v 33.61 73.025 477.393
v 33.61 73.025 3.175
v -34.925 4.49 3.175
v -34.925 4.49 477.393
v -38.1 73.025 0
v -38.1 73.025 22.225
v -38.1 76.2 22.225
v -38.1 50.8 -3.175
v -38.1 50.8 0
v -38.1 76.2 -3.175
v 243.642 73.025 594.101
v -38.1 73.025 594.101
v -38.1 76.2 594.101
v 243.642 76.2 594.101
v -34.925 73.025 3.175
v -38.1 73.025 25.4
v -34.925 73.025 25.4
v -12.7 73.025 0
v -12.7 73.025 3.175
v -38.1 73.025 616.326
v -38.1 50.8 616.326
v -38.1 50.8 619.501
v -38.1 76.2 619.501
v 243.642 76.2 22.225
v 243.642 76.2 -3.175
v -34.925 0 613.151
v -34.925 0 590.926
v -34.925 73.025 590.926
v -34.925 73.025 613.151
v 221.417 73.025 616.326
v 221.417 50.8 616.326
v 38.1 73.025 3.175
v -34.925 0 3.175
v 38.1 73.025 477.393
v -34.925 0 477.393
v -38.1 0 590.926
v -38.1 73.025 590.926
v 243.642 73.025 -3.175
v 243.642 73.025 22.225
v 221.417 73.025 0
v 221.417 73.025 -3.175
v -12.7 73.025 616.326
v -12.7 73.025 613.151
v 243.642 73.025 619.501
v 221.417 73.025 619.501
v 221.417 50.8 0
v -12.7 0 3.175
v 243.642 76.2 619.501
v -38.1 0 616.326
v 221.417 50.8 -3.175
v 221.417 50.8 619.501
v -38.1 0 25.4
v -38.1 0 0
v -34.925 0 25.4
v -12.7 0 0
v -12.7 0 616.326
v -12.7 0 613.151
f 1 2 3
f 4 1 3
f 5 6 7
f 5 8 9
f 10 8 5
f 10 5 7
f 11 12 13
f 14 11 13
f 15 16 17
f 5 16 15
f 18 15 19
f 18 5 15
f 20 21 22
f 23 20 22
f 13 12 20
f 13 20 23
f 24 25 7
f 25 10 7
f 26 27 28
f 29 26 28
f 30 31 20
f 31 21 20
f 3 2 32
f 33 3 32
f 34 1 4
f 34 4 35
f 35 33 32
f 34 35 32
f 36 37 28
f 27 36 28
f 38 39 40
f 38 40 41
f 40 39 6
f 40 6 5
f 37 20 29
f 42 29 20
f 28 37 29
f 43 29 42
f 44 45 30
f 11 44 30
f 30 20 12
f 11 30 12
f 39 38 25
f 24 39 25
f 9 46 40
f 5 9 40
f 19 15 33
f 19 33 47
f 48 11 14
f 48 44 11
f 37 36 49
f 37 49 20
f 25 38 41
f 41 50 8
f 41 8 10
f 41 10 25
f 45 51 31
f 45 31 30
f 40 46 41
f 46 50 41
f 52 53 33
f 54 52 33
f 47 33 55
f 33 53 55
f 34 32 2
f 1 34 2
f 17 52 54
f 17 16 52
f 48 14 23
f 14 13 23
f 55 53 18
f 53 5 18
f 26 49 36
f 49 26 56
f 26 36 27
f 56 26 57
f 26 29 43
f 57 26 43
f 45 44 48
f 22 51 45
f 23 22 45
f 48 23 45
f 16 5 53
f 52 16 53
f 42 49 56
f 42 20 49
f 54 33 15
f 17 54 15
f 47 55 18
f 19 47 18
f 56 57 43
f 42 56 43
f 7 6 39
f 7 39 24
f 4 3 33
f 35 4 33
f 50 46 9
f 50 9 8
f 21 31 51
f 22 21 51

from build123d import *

# Parameters (mm, degrees)
F0_W      = 22.225
F0_H      = 22.225
F0_W_2    = 3.175
F0_H_2    = 3.175
F1_DEPTH  = 3.175
F2_START  = 3.175
F2_DEPTH  = 474.218
F3_DEPTH  = 22.225
F4_START  = -619.50092
F1_FACE_W = 76.2
F1_FACE_H = 25.4
F4_DEPTH  = 3.175
F5_START  = 571.87592
F3_FACE_W = 76.2
F3_FACE_H = 3.175
F5_DEPTH  = 22.225
F6_DEPTH  = 3.175
F7_DEPTH  = 25.4
F8_START  = 565.52592
F7_FACE_W = 3.175
F7_FACE_H = 73.025
F8_DEPTH  = 25.4
F9_START  = 609.97592
F6_FACE_W = 22.225
F6_FACE_H = 73.025
F9_DEPTH  = 3.175
F10_W     = 3.175
F10_H     = 3.175
F10_H_2   = 22.225
F11_DEPTH = 205.54188
F12_DEPTH = 183.31688
F13_DEPTH = 205.54188
F10_W_2   = 22.225
F14_DEPTH = 183.31688


with BuildPart() as f1:
    # F0 (on Top) → F1 (new body)
    with BuildSketch(Plane.XY):
        Polygon((38.1, 50.8), (38.1, 73.025), (15.875, 50.8), align=None)
        Polygon((15.875, 50.8), (38.1, 73.025), (33.6098719395, 73.025), (11.3848719395, 50.8), align=None)
        Polygon((33.6098719395, 73.025), (-12.7, 73.025), (-12.7, 50.8), (11.3848719395, 50.8), align=None)
        with Locations((-23.8125, 61.9125)):
            Rectangle(F0_W, F0_H)
        with Locations((-36.5125, 61.9125)):
            Rectangle(F0_W_2, F0_H)
        Polygon((38.1, 76.2), (-34.925, 76.2), (-34.925, 73.025), (-12.7, 73.025), (33.6098719395, 73.025), (38.1, 73.025), align=None)
        with Locations((-36.5125, 74.6125)):
            Rectangle(F0_W_2, F0_H_2)
    extrude(amount=-F1_DEPTH)

    # F0 (on Top) → F3 (join)
    with BuildSketch(Plane.XY):
        Polygon((38.1, 76.2), (-34.925, 76.2), (-34.925, 73.025), (-12.7, 73.025), (33.6098719395, 73.025), (38.1, 73.025), align=None)
        with Locations((-36.5125, 74.6125)):
            Rectangle(F0_W_2, F0_H_2)
    extrude(amount=F3_DEPTH)

    # F10 (on face) → F11 (join)
    with BuildSketch(Plane.YZ.offset(38.1)):
        with Locations((74.6125, -1.5875)):
            Rectangle(F10_W, F10_H)
        with Locations((74.6125, 11.1125)):
            Rectangle(F10_W, F10_H_2)
    extrude(amount=F11_DEPTH)

    # F12 (add): a face of the model
    f12_faces = [f1.faces().sort_by_distance(p)[0] for p in [
        (38.1, 61.9125, -1.5875),
    ]]
    extrude(f12_faces, amount=F12_DEPTH)


with BuildPart() as f2:
    # F0 (on Top) → F2 (new body)
    with BuildSketch(Plane.XY.offset(F2_START)):
        Polygon((15.875, 50.8), (38.1, 73.025), (33.6098719395, 73.025), (11.3848719395, 50.8), align=None)
        Polygon((-12.7, 22.225), (15.875, 50.8), (11.3848719395, 50.8), (-12.7, 26.7151280605), align=None)
        Polygon((-12.7, 26.7151280605), (-34.925, 4.4901280605), (-34.925, 0), (-12.7, 22.225), align=None)
    extrude(amount=F2_DEPTH)


with BuildPart() as f4:
    # F1_face (on face) → F4 (new body)
    with BuildSketch(Plane(origin=(0, 63.5, -3.175), x_dir=(1, 0, 0), z_dir=(0, 0, -1)).offset(F4_START)):
        Rectangle(F1_FACE_W, F1_FACE_H)
    extrude(amount=-F4_DEPTH)

    # F3_face (on face) → F5 (join)
    with BuildSketch(Plane(origin=(0, 74.6125, 22.225), x_dir=(1, 0, 0), z_dir=(0, 0, 1)).offset(F5_START)):
        Rectangle(F3_FACE_W, F3_FACE_H)
    extrude(amount=F5_DEPTH)

    # F10 (on face) → F13 (join)
    with BuildSketch(Plane.YZ.offset(38.1)):
        with Locations((74.6125, 605.21342)):
            Rectangle(F10_W, F10_H_2)
        with Locations((74.6125, 617.91342)):
            Rectangle(F10_W, F10_H)
    extrude(amount=F13_DEPTH)

    # F10 (on face) → F14 (join)
    with BuildSketch(Plane.YZ.offset(38.1)):
        with Locations((61.9125, 617.91342)):
            Rectangle(F10_W_2, F10_H)
    extrude(amount=F14_DEPTH)


with BuildPart() as f6:
    # F0 (on Top) → F6 (new body)
    with BuildSketch(Plane.XY):
        Polygon((-12.7, 0), (-12.7, 22.225), (-34.925, 0), align=None)
        Polygon((-12.7, 26.7151280605), (-34.925, 4.4901280605), (-34.925, 0), (-12.7, 22.225), align=None)
        Polygon((-12.7, 50.8), (-34.925, 50.8), (-34.925, 47.625), (-34.925, 4.4901280605), (-12.7, 26.7151280605), align=None)
        with Locations((-23.8125, 61.9125)):
            Rectangle(F0_W, F0_H)
    extrude(amount=F6_DEPTH)

    # F0 (on Top) → F7 (join)
    with BuildSketch(Plane.XY):
        Polygon((-34.925, 47.625), (-38.1, 47.625), (-38.1, 0), (-34.925, 0), (-34.925, 4.4901280605), align=None)
        with Locations((-36.5125, 61.9125)):
            Rectangle(F0_W_2, F0_H)
        with Locations((-36.5125, 49.2125)):
            Rectangle(F0_W_2, F0_H_2)
    extrude(amount=F7_DEPTH)


with BuildPart() as f8:
    # F7_face (on face) → F8 (new body)
    with BuildSketch(Plane(origin=(-36.5125, 36.5125, 25.4), x_dir=(1, 0, 0), z_dir=(0, 0, 1)).offset(F8_START)):
        Rectangle(F7_FACE_W, F7_FACE_H)
    extrude(amount=F8_DEPTH)

    # F6_face (on face) → F9 (join)
    with BuildSketch(Plane(origin=(-23.8125, 36.5125, 3.175), x_dir=(1, 0, 0), z_dir=(0, 0, 1)).offset(F9_START)):
        Rectangle(F6_FACE_W, F6_FACE_H)
    extrude(amount=F9_DEPTH)


solid = Compound([f1.part, f2.part, f4.part, f6.part, f8.part])
